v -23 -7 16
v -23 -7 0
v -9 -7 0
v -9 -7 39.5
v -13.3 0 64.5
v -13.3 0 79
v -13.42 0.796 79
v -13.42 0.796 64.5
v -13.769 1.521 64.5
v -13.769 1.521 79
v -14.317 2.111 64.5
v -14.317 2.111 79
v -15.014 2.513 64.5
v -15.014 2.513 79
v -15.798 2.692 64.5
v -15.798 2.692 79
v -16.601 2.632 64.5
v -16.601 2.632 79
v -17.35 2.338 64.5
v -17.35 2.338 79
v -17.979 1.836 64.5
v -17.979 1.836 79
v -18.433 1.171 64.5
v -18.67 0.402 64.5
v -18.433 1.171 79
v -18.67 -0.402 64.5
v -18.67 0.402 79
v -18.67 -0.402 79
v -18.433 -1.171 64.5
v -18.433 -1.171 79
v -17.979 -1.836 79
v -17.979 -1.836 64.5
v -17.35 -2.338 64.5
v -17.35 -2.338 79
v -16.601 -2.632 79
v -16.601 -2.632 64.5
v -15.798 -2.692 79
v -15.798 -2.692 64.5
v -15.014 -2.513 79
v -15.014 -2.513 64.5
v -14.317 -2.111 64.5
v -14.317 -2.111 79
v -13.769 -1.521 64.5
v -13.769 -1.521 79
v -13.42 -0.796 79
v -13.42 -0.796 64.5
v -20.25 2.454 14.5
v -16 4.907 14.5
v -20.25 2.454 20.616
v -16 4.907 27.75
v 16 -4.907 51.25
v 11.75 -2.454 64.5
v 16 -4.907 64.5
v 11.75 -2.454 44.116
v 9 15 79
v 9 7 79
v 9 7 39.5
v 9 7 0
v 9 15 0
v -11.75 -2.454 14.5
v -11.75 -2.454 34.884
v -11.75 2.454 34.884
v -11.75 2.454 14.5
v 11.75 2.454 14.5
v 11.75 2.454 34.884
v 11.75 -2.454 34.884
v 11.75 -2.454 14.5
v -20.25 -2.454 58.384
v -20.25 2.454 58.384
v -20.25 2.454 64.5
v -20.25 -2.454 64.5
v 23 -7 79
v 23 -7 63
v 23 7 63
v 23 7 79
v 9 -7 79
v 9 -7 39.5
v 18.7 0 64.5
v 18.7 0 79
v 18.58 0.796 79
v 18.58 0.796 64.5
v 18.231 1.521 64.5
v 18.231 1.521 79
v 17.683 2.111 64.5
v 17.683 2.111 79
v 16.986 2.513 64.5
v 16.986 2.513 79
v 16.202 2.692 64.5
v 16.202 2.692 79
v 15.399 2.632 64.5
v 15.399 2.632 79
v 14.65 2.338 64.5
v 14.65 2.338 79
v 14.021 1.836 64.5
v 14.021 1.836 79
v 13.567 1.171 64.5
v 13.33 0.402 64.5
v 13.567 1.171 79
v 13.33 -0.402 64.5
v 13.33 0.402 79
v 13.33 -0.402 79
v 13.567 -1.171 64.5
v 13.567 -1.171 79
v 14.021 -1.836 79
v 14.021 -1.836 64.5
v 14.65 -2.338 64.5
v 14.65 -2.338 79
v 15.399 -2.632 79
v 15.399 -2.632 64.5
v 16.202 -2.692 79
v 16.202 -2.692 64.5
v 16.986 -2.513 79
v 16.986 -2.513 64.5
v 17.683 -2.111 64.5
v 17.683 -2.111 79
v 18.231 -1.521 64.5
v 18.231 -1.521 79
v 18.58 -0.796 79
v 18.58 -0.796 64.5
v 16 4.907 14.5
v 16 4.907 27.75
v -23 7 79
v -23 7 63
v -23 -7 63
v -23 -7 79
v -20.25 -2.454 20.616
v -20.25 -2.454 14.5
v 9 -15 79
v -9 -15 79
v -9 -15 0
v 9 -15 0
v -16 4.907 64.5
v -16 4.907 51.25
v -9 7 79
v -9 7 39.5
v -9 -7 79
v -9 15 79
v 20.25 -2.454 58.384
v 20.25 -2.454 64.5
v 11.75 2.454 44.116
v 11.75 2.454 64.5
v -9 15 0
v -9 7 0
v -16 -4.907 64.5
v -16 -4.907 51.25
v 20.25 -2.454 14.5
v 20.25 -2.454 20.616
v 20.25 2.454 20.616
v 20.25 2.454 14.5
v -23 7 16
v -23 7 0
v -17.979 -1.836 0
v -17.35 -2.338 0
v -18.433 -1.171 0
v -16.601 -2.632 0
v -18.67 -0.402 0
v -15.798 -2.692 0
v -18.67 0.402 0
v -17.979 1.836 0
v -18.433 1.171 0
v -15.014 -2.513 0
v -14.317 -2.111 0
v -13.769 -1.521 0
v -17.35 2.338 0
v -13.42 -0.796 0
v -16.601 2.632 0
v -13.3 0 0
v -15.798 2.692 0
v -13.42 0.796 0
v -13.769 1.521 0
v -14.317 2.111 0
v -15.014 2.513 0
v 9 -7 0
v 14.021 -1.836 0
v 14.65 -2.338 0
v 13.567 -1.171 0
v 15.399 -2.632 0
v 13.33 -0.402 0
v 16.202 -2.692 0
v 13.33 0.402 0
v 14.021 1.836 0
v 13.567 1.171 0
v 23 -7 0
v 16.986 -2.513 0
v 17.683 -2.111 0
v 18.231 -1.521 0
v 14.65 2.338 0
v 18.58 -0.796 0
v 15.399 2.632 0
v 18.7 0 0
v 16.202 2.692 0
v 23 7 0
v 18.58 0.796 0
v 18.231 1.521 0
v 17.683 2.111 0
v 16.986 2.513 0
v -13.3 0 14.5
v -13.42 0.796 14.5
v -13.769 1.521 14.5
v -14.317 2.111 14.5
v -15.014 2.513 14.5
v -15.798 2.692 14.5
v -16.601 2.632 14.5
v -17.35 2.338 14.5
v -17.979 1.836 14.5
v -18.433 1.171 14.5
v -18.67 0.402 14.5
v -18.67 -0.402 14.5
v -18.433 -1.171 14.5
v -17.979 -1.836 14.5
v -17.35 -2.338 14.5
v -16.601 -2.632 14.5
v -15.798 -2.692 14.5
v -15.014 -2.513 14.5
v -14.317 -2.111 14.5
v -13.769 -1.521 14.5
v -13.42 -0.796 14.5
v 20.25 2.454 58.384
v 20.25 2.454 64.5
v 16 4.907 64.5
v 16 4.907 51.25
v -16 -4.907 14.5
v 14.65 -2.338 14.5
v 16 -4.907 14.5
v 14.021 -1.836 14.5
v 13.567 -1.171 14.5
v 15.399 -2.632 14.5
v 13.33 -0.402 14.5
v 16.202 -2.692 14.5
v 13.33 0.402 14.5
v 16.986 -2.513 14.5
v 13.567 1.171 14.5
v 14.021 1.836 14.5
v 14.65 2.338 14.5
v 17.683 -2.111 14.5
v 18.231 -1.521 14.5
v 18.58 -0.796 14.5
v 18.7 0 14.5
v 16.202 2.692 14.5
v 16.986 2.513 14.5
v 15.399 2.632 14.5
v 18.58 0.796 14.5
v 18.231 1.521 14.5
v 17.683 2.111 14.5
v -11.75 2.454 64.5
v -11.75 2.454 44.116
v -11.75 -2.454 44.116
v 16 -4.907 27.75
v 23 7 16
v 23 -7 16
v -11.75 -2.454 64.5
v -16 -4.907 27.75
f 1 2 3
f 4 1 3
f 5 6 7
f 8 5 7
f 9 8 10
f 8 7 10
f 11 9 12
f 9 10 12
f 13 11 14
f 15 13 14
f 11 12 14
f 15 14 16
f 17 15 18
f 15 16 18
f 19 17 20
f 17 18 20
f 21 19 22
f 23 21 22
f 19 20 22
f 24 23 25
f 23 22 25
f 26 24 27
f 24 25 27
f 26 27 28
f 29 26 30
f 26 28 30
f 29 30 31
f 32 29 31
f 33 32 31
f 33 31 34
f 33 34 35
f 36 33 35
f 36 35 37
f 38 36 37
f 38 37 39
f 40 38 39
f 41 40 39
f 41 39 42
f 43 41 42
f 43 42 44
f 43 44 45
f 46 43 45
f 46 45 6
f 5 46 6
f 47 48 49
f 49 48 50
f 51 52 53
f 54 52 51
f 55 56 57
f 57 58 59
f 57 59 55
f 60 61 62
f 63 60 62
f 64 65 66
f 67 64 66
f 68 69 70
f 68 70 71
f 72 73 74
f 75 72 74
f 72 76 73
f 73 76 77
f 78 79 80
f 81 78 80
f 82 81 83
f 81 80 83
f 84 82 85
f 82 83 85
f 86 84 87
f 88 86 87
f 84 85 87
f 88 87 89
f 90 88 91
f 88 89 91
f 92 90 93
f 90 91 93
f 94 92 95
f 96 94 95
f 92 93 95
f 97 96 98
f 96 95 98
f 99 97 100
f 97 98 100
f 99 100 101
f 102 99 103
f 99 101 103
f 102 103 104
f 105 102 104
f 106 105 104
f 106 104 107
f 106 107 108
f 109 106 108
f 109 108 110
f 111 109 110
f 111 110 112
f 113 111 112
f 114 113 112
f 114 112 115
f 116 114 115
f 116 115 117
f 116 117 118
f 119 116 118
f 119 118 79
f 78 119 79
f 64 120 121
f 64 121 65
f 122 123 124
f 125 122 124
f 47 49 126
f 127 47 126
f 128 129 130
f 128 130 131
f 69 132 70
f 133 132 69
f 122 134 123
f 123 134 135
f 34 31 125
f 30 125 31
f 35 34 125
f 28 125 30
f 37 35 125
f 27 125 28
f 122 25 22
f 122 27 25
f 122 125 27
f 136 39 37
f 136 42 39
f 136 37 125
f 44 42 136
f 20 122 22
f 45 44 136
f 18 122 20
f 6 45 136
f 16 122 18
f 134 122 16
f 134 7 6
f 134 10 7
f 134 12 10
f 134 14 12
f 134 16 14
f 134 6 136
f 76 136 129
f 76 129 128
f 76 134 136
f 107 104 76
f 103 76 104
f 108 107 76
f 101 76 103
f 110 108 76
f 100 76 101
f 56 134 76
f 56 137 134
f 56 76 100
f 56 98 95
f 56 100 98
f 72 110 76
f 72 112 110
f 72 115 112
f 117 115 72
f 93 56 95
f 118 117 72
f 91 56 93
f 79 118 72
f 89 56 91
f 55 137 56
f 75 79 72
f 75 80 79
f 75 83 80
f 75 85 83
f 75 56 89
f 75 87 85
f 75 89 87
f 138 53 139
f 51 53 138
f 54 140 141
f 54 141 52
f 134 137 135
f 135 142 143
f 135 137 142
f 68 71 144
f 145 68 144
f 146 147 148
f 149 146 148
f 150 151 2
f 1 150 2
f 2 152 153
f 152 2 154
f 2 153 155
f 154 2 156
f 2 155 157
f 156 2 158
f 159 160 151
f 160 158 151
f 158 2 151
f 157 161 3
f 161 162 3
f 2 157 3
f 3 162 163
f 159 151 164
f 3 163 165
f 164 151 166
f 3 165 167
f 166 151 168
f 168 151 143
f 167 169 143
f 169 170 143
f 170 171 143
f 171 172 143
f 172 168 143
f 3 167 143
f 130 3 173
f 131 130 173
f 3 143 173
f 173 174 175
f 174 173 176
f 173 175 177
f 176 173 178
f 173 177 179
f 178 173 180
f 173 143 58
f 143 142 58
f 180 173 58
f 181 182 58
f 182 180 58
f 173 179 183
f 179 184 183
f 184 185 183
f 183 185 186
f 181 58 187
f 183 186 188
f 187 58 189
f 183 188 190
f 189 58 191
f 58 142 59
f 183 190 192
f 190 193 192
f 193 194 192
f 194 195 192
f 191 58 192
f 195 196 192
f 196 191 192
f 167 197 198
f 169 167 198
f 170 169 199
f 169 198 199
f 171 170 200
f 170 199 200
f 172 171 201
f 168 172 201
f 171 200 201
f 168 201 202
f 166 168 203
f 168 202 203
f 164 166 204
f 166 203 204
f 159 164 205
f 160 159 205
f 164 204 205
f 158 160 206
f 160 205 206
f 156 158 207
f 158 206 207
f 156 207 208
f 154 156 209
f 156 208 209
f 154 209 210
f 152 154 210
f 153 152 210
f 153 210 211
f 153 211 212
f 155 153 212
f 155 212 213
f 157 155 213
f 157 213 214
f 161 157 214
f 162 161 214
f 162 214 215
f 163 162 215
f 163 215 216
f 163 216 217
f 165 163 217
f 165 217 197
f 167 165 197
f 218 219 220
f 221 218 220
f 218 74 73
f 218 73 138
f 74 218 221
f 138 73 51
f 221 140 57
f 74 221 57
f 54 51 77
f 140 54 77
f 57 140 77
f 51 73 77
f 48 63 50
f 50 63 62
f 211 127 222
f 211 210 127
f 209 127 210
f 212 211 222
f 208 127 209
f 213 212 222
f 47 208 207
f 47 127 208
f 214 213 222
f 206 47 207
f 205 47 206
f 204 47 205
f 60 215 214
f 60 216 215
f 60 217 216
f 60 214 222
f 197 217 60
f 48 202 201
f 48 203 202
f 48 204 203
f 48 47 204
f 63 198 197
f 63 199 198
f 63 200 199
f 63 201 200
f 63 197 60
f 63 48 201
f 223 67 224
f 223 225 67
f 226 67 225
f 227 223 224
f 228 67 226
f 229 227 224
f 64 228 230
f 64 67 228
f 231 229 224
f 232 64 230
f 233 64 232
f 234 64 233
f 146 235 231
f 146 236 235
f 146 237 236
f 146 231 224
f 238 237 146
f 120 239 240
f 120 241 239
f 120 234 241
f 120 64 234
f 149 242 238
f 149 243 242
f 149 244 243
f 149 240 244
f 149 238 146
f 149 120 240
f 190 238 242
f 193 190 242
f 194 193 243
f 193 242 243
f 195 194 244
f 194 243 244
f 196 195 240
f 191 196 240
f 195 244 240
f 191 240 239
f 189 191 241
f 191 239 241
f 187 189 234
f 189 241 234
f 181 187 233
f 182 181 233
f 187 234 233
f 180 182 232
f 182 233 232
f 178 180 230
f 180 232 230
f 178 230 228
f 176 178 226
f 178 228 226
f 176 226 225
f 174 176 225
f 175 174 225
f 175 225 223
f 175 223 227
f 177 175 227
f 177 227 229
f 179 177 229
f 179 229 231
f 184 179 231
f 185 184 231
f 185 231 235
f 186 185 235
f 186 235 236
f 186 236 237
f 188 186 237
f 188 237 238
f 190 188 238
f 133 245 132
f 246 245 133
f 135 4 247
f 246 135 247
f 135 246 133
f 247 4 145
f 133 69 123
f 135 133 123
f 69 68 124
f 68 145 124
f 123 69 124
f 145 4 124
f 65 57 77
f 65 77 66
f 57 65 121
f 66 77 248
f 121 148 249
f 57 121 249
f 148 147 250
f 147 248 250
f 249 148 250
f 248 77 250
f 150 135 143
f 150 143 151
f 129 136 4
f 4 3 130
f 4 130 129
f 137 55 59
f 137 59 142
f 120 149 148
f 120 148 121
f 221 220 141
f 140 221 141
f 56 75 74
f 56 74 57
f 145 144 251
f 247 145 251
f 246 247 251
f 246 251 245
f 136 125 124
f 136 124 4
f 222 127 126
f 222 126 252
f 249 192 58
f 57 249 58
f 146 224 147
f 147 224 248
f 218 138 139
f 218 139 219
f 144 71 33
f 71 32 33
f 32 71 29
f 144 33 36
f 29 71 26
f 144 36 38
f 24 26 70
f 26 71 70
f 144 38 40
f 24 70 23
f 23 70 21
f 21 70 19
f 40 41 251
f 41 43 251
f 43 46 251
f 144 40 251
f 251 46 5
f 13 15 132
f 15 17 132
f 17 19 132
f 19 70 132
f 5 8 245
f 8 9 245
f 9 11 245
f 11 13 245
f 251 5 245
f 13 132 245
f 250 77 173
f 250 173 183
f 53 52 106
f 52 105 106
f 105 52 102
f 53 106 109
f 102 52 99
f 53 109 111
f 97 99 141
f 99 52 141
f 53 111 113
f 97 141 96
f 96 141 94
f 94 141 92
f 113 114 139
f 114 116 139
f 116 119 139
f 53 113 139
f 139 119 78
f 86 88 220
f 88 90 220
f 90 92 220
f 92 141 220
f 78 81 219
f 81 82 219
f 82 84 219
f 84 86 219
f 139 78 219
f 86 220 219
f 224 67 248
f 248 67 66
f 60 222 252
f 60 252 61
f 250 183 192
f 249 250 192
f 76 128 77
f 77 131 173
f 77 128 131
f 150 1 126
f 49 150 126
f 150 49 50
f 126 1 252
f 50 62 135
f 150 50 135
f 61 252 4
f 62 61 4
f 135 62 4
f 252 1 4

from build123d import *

# Parameters (mm, degrees)
F1_DEPTH      = 79
F3_DEPTH      = 14
F4_R          = 2.7
F5_DEPTH      = 79
F8_DEPTH      = 25
F8_DEPTH_BACK = 25


with BuildPart() as f1:
    # F0 (on Top) → F1 (new body)
    with BuildSketch(Plane.XY):
        Polygon((-9, 7), (-23, 7), (-23, -7), (-9, -7), (-9, -15), (9, -15), (9, -7), (23, -7), (23, 7), (9, 7), (9, 15), (-9, 15), align=None)
    extrude(amount=F1_DEPTH)

    # F2 (on face) → F3 (cut, through all)
    with BuildSketch(Plane.XZ.offset(7)):
        Polygon((-9, 39.5), (-23, 63), (-23, 16), align=None)
        Polygon((23, 63), (9, 39.5), (23, 16), align=None)
    extrude(amount=-F3_DEPTH, mode=Mode.SUBTRACT)

    # F4 (on face) → F5 (cut)
    with BuildSketch(Plane.XY.offset(79)):
        with Locations((-16, 0)):
            Circle(F4_R)
        with Locations((16, 0)):
            Circle(F4_R)
    extrude(amount=-F5_DEPTH, mode=Mode.SUBTRACT)

    # F7 (on offset) → F8 (cut, two sides)
    with BuildSketch(Plane.XY.offset(39.5)) as f8_sk:
        Polygon((-16, 4.9074772881), (-20.25, 2.4537386441), (-20.25, -2.4537386441), (-16, -4.9074772881), (-11.75, -2.4537386441), (-11.75, 2.4537386441), align=None)
        Polygon((20.25, -2.4537386441), (20.25, 2.4537386441), (16, 4.9074772881), (11.75, 2.4537386441), (11.75, -2.4537386441), (16, -4.9074772881), align=None)
    extrude(amount=-F8_DEPTH, mode=Mode.SUBTRACT)
    extrude(f8_sk.sketch, amount=F8_DEPTH_BACK, mode=Mode.SUBTRACT)


solid = f1.part
